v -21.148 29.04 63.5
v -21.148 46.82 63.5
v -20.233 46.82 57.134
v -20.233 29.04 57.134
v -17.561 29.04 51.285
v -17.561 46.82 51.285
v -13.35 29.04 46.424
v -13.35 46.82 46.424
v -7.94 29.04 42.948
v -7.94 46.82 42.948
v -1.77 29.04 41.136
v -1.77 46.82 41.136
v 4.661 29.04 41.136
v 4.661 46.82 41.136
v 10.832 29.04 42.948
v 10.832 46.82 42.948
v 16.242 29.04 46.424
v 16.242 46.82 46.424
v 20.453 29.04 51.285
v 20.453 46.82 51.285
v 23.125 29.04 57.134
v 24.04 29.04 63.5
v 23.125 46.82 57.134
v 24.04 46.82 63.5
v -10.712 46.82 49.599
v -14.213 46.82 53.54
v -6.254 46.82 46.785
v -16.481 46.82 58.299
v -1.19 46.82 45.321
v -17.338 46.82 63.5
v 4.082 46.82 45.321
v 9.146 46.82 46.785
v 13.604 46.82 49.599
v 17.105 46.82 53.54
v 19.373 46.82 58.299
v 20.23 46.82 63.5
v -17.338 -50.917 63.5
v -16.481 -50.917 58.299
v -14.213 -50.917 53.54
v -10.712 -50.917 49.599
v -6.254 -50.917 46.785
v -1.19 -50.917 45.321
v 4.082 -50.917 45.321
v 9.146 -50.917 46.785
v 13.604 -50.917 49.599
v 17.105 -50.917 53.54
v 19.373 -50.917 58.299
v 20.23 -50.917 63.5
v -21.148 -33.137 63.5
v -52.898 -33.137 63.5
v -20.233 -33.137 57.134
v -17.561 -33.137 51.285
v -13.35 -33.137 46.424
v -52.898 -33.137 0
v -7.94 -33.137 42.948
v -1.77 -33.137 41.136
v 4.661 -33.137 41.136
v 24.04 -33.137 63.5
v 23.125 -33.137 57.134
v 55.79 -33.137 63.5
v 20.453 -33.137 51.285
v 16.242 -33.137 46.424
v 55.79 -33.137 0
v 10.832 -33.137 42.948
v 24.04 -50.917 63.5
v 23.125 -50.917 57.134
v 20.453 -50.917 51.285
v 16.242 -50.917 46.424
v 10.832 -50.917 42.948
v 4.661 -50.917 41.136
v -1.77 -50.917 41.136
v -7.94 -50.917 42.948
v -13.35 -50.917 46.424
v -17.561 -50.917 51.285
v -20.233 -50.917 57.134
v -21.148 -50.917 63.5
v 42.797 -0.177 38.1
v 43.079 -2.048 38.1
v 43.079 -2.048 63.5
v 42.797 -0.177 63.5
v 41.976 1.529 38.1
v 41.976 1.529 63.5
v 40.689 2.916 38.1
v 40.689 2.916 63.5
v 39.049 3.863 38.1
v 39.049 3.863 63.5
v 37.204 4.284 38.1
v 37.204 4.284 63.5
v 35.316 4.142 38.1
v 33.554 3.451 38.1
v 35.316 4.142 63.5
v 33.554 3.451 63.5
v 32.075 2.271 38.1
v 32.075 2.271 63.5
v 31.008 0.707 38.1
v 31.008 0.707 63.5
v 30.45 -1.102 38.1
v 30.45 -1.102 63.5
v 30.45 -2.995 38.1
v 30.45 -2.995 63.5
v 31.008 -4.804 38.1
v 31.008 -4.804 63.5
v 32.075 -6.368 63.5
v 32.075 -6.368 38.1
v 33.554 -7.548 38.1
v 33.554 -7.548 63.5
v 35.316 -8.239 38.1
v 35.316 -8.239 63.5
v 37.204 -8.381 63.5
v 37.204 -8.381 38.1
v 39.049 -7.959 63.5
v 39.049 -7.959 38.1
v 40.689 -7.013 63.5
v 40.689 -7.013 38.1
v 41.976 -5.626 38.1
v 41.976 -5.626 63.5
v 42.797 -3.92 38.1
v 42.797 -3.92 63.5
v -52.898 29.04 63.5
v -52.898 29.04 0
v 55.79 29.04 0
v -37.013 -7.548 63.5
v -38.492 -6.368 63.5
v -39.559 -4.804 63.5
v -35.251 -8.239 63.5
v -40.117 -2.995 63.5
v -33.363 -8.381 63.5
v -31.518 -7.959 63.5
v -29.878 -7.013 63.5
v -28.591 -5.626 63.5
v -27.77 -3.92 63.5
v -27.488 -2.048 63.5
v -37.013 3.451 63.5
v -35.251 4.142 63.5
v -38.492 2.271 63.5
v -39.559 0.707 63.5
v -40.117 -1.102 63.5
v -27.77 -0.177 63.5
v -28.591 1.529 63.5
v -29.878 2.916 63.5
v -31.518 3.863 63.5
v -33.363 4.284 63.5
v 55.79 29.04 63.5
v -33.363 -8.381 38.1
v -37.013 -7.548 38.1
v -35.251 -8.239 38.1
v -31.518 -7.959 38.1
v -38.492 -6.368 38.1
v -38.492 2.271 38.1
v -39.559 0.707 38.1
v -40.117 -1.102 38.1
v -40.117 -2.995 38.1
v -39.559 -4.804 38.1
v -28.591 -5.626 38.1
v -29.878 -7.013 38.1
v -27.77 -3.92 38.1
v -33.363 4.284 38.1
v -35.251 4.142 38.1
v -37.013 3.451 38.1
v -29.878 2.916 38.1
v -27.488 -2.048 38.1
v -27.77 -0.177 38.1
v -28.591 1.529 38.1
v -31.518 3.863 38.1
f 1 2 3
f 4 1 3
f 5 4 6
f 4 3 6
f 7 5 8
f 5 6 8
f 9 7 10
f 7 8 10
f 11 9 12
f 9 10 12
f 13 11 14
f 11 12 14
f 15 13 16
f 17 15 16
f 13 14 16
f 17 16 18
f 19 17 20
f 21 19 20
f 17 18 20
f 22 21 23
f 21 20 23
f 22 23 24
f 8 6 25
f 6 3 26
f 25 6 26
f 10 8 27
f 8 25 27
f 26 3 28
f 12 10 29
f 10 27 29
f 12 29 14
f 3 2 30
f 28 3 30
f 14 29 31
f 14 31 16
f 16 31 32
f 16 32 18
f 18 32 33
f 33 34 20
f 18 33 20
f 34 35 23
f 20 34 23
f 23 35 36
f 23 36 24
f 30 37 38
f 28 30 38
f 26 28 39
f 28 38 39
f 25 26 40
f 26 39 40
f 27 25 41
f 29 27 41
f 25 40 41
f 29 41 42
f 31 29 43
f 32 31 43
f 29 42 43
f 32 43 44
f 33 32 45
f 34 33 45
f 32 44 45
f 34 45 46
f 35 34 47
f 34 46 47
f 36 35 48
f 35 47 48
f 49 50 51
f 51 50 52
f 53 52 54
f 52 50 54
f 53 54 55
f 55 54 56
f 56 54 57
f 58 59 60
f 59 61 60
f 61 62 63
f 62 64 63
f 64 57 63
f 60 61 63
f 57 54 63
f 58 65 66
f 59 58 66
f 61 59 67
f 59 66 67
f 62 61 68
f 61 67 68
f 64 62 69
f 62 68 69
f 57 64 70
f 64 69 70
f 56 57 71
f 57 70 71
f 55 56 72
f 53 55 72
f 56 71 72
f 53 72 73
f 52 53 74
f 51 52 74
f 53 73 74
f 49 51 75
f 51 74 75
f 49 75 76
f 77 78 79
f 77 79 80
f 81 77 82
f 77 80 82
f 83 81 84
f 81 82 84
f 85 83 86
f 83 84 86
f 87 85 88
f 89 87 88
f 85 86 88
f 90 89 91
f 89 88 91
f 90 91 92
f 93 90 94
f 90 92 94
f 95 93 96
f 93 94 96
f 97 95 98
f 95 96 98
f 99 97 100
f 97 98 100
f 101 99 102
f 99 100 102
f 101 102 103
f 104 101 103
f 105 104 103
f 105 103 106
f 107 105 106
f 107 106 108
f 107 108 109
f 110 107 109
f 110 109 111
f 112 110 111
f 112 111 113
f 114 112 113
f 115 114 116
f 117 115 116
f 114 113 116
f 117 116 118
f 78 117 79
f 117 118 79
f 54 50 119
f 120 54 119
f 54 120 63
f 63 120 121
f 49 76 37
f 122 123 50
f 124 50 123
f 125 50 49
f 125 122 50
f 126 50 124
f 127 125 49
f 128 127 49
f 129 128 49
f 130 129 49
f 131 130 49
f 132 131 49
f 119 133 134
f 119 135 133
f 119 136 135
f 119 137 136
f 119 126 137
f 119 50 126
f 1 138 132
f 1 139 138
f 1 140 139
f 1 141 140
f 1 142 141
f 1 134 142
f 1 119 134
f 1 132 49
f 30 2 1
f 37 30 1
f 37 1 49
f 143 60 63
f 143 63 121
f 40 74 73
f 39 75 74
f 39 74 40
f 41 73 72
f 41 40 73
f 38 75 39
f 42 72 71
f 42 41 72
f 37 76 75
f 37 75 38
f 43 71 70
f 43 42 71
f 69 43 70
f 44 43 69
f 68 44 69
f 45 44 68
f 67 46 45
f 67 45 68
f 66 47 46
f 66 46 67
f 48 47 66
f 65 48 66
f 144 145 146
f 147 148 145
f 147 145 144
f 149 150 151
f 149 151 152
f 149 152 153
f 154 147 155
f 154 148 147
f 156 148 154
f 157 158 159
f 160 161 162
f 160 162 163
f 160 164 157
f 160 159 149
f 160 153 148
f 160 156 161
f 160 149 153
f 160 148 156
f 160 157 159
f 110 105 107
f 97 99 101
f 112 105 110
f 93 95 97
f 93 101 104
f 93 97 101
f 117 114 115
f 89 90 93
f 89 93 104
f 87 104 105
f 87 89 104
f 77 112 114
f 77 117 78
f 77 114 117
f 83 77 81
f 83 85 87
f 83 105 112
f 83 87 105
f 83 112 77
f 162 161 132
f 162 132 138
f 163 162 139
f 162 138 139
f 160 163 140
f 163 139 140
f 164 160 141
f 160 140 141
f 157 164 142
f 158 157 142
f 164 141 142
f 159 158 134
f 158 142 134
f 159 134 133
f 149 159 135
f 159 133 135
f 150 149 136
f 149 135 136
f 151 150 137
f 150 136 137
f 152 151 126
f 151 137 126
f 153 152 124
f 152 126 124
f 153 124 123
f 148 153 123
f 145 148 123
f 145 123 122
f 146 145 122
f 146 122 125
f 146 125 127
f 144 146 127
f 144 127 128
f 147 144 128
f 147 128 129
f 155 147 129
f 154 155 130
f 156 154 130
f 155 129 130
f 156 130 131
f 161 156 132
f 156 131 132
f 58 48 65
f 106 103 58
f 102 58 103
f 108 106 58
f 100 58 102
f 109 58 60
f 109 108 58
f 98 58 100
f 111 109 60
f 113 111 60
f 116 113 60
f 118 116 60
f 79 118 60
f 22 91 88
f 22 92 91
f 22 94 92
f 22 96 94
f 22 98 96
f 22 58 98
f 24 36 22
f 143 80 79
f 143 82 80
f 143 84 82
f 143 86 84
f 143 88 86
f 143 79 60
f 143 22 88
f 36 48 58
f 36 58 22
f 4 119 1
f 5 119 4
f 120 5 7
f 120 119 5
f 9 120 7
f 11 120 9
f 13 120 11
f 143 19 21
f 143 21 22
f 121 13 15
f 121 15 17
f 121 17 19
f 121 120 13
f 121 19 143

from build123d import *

# Parameters (mm, degrees)
F0_W      = 108.688287437
F0_H      = 62.1764454991
F1_DEPTH  = 63.5
F2_R      = 6.35
F3_DEPTH  = 25.4
F4_W      = 45.188287437
F4_H      = 17.78
F4_H_2    = 62.1764454991
F5_DEPTH  = 25.4
F7_DEPTH  = 17.78
F9_DEPTH  = 97.7364454991
F11_DEPTH = 17.78
F13_DEPTH = 17.78


with BuildPart() as f1:
    # F0 (on Top) → F1 (new body)
    with BuildSketch(Plane.XY):
        with Locations((1.4459639788, -2.0484467968)):
            Rectangle(F0_W, F0_H)
    extrude(amount=F1_DEPTH)

    # F2 (on face) → F3 (cut)
    with BuildSketch(Plane.XY.offset(63.5)):
        with Locations((-33.8375324716, -2.0484467968)):
            Circle(F2_R)
        with Locations((36.7294604292, -2.0484467968)):
            Circle(F2_R)
    extrude(amount=-F3_DEPTH, mode=Mode.SUBTRACT)

    # F4 (on face) → F5 (join)
    with BuildSketch(Plane.XY.offset(63.5)):
        with Locations((1.4459639788, -42.0266695464)):
            Rectangle(F4_W, F4_H)
        with Locations((1.4459639788, -2.0484467968)):
            Rectangle(F4_W, F4_H_2)
        with Locations((1.4459639788, 37.9297759527)):
            Rectangle(F4_W, F4_H)
    extrude(amount=-F5_DEPTH)

    # F6 (on face) → F7 (cut, through all)
    with BuildSketch(Plane.XZ.offset(50.9166695464)):
        with BuildLine():
            ThreePointArc((24.0401076972, 63.5), (1.4459639788, 40.9058562815), (-21.1481797397, 63.5))
            Line((-21.1481797397, 63.5), (-21.1481797397, 38.1))
            Line((-21.1481797397, 38.1), (24.0401076972, 38.1))
            Line((24.0401076972, 38.1), (24.0401076972, 63.5))
        make_face()
    extrude(amount=-F7_DEPTH, mode=Mode.SUBTRACT)

    # F8 (on face) → F9 (cut, through all)
    with BuildSketch(Plane.XZ.offset(50.9166695464)):
        with BuildLine():
            Line((20.2301076972, 63.5), (-17.3381797397, 63.5))
            ThreePointArc((-17.3381797397, 63.5), (1.4459639788, 45.134926003), (20.2301076972, 63.5))
        make_face()
    extrude(amount=-F9_DEPTH, mode=Mode.SUBTRACT)

    # F10 (on face) → F11 (join, through all)
    with BuildSketch(Plane(origin=(0, 46.8197759527, 0), x_dir=(-1, 0, 0), z_dir=(0, 1, 0))):
        with BuildLine():
            ThreePointArc((21.1481797397, 63.5), (-1.4459639788, 40.9058562815), (-24.0401076972, 63.5))
            Line((-24.0401076972, 63.5), (-24.0401076972, 38.1))
            Line((-24.0401076972, 38.1), (21.1481797397, 38.1))
            Line((21.1481797397, 38.1), (21.1481797397, 63.5))
        make_face()
    extrude(amount=-F11_DEPTH)

    # F12 (on face) → F13 (cut, through all)
    with BuildSketch(Plane(origin=(0, 46.8197759527, 0), x_dir=(-1, 0, 0), z_dir=(0, 1, 0))):
        with BuildLine():
            ThreePointArc((21.1481797397, 63.5), (-1.4459639788, 40.9058562815), (-24.0401076972, 63.5))
            Line((-24.0401076972, 63.5), (-24.0401076972, 38.1))
            Line((-24.0401076972, 38.1), (21.1481797397, 38.1))
            Line((21.1481797397, 38.1), (21.1481797397, 63.5))
        make_face()
    extrude(amount=-F13_DEPTH, mode=Mode.SUBTRACT)


solid = f1.part
